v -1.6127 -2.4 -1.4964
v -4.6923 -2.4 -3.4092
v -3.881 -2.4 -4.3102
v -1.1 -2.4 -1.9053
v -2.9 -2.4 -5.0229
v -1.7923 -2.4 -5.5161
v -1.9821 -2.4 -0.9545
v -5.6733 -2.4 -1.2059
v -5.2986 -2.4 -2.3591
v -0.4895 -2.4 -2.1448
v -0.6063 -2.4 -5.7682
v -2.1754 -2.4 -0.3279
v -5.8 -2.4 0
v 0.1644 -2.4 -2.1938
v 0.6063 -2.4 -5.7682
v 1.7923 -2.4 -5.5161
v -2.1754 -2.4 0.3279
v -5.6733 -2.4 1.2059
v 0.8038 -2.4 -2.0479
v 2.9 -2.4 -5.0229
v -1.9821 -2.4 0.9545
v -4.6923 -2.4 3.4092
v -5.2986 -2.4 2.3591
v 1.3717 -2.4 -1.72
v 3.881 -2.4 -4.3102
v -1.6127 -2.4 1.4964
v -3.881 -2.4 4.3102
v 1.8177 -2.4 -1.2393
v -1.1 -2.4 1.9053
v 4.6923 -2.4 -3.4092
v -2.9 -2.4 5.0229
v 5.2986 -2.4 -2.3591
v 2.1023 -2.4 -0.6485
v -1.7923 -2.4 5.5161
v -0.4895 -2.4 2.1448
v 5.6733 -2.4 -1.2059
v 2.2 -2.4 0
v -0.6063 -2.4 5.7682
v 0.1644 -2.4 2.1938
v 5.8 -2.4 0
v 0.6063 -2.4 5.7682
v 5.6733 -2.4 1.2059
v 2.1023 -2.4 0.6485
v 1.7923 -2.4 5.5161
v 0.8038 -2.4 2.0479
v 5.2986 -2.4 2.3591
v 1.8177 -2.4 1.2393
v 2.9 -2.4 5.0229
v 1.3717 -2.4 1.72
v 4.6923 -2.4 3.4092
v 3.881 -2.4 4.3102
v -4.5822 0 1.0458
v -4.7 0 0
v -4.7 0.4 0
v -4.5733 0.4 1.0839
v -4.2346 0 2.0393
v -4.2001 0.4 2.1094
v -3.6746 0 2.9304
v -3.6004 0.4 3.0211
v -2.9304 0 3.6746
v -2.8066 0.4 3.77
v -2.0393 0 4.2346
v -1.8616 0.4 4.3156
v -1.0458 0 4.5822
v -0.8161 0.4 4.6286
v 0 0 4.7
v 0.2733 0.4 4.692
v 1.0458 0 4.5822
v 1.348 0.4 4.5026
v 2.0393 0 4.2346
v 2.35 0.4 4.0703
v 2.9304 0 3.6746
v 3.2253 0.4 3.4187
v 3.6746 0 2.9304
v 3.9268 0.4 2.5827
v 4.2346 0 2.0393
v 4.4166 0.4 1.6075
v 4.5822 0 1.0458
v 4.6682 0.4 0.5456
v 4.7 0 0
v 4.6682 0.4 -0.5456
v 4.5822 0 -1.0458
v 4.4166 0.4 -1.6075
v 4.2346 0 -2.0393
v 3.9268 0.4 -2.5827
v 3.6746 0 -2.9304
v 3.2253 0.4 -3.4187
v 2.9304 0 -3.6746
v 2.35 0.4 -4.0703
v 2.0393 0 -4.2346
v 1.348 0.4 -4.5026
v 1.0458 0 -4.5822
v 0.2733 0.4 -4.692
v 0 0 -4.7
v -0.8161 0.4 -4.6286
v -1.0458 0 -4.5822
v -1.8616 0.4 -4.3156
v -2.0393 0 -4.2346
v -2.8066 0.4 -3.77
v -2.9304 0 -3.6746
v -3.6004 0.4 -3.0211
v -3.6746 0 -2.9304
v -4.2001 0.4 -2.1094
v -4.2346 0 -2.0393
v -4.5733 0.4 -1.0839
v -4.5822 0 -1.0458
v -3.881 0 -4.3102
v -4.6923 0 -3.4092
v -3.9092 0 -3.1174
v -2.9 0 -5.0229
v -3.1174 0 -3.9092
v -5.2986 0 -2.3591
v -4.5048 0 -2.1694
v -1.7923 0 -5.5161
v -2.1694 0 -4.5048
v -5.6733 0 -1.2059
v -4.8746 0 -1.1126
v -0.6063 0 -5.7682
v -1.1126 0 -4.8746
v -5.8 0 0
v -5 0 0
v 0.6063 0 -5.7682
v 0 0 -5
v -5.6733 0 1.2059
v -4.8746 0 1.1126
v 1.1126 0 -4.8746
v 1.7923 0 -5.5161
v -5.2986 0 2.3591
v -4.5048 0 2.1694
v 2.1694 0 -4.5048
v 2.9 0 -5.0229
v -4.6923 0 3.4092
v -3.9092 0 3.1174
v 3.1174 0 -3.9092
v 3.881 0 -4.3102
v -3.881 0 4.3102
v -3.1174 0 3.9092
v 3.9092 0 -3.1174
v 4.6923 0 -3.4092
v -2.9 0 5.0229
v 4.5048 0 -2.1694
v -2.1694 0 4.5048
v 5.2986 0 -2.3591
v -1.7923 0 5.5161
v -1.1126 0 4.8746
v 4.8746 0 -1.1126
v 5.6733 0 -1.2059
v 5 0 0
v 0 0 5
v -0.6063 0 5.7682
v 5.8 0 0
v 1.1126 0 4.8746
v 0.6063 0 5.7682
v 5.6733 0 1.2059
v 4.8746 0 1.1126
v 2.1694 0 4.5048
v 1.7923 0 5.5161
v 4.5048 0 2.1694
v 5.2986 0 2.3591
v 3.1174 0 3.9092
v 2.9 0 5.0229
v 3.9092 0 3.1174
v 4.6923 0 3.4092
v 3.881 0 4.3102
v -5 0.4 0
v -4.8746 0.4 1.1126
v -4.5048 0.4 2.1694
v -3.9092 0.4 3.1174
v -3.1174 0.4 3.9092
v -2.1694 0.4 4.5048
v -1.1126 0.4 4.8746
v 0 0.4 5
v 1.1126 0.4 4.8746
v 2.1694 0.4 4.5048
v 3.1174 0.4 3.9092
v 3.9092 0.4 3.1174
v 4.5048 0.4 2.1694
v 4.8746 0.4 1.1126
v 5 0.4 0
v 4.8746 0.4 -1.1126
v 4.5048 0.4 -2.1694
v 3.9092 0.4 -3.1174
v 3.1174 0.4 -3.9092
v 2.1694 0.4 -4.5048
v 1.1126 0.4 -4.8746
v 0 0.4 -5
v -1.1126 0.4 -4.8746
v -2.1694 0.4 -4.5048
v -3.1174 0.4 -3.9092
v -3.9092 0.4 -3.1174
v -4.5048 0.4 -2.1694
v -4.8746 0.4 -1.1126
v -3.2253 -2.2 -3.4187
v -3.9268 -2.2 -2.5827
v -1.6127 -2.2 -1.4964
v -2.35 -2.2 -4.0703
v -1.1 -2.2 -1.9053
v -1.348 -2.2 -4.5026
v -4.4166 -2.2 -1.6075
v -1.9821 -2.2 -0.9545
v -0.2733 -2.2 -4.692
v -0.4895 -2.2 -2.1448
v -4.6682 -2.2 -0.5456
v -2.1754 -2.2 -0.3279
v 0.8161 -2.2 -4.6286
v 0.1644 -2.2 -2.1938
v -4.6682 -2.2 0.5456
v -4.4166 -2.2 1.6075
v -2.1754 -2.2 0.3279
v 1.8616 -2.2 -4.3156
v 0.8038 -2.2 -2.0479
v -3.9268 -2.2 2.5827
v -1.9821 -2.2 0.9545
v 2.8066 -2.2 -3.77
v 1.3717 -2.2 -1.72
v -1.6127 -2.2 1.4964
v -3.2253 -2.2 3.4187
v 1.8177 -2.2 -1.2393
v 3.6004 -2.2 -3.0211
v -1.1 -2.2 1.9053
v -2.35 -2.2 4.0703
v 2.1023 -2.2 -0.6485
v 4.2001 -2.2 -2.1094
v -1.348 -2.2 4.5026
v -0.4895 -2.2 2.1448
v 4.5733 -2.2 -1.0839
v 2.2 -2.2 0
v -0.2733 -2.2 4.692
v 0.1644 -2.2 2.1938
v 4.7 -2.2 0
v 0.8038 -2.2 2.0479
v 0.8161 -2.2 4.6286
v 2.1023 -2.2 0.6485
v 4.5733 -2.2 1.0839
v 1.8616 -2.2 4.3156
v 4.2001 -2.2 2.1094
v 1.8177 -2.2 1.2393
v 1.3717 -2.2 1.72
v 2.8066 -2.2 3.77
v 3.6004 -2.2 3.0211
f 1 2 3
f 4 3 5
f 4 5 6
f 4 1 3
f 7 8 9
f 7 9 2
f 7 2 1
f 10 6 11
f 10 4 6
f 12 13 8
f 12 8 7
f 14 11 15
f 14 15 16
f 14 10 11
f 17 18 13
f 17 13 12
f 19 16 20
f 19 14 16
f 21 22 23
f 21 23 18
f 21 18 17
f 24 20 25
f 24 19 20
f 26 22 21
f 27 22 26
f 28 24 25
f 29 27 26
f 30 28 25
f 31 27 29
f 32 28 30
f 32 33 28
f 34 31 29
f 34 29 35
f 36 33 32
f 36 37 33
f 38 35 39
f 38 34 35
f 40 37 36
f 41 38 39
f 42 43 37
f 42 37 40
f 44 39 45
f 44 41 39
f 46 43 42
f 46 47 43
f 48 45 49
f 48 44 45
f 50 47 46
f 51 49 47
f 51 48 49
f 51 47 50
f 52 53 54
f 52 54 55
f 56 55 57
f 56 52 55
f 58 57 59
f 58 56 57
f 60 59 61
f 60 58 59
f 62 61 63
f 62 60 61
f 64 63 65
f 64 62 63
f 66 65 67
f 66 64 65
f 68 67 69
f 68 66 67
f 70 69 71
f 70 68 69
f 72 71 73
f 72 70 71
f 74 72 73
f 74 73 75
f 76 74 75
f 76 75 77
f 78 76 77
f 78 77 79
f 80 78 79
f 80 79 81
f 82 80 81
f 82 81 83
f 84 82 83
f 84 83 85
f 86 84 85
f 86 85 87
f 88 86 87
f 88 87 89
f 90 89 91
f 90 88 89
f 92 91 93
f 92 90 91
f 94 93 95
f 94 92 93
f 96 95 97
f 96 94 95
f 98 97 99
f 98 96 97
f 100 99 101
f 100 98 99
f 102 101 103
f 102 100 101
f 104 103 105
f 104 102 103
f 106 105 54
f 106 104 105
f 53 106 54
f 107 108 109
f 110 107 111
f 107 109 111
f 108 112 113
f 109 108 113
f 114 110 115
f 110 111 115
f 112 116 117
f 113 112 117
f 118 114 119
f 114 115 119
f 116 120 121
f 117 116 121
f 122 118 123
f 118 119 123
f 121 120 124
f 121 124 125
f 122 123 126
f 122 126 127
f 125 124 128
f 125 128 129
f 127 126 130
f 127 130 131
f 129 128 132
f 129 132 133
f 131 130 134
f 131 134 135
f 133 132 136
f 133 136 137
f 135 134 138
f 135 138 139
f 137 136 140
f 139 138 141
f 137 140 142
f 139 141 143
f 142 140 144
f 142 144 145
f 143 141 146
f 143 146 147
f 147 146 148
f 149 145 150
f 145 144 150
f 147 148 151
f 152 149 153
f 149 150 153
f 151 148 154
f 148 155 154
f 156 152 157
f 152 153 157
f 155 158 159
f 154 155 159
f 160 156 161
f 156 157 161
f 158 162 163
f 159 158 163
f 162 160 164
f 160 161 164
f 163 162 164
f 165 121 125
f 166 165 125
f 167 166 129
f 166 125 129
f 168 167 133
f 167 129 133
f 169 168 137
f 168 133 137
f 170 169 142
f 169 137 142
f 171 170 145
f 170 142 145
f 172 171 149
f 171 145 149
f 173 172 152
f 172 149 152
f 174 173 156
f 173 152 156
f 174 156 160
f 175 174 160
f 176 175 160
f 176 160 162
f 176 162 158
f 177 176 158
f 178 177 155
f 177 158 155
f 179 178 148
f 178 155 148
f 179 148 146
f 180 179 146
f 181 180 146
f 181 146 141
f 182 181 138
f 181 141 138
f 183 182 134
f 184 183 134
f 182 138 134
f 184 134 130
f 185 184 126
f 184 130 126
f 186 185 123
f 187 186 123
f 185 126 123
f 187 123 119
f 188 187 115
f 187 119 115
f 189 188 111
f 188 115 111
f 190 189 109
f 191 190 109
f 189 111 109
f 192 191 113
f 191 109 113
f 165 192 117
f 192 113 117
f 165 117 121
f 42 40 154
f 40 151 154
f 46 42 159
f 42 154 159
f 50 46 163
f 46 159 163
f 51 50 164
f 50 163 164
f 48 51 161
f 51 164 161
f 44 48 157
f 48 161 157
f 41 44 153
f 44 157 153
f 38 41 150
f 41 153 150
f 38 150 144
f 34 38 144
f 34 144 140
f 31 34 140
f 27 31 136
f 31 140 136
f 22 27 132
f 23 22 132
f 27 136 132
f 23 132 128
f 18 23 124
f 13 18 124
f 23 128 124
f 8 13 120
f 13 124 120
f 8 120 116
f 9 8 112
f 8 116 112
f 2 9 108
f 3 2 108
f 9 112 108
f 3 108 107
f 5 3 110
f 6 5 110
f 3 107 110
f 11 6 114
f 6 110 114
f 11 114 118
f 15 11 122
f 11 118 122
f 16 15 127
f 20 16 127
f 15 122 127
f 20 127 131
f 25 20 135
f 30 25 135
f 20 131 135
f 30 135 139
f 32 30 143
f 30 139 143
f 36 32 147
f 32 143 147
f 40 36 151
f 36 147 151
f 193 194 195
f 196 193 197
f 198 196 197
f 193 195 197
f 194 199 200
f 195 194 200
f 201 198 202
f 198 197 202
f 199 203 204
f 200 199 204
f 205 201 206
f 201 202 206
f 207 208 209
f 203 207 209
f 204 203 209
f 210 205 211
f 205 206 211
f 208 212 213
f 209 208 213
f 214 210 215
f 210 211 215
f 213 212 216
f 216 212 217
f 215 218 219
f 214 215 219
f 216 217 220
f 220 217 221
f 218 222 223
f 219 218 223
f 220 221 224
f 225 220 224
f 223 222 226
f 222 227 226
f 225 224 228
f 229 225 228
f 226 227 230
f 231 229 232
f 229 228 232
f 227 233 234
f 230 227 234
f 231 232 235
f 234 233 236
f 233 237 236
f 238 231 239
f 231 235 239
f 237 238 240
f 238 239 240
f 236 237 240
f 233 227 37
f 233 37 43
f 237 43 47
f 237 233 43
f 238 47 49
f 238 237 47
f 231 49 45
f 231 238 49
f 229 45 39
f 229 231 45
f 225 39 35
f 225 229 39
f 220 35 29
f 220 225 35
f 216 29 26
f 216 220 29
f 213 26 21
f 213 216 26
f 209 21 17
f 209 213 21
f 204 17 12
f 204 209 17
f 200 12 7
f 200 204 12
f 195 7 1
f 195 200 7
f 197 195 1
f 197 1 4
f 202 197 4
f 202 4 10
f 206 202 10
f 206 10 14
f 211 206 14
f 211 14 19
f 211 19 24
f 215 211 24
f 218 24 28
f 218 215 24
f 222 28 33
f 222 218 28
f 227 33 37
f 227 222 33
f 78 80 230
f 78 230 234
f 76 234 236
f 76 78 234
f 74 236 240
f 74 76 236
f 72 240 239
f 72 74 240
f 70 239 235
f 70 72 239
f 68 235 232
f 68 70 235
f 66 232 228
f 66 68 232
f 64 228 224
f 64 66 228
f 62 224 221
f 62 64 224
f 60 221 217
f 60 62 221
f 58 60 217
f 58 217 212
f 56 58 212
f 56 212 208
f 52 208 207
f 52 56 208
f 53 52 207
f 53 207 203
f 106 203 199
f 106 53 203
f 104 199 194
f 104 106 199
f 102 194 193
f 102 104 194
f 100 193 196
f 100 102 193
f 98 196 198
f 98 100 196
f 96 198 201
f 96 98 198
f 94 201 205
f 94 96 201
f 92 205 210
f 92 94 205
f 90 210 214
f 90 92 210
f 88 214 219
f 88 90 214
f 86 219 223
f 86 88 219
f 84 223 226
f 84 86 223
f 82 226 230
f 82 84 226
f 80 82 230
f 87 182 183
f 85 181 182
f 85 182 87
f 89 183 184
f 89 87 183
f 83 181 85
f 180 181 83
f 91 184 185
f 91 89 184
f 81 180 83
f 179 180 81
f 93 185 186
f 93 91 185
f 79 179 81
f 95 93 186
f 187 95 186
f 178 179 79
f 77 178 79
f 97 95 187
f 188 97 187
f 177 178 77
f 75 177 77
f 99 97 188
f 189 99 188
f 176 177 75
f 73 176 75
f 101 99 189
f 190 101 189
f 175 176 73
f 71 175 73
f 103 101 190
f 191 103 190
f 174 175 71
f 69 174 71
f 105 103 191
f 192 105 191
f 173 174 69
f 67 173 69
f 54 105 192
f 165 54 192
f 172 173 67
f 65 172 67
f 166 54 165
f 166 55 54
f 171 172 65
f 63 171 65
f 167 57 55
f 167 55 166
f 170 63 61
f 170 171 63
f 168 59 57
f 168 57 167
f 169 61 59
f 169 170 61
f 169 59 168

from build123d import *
from build123d import SkipClean  # not in build123d's __all__

# Parameters (mm, degrees)
F0_R     = 5.8
F1_DEPTH = 1.8
F2_R     = 5.8
F2_R_2   = 4.7
F3_DEPTH = 0.4
F4_R     = 4.7
F5_DEPTH = 1.8
F6_R     = 5.8
F6_R_2   = 4.7
F6_R_3   = 2.2
F7_DEPTH = 0.2
F8_R     = 5
F8_R_2   = 4.7
F9_DEPTH = 0.4


# Not quite as in the source:
# - a feature names something its author has since deleted; it is built from what else it names


with BuildPart() as f1:
    # F0 (on Front) → F1 (new body)
    with BuildSketch(Plane.XZ):
        Circle(F0_R)
    extrude(amount=F1_DEPTH)

    # F2 (on face) → F3 (join)
    with BuildSketch(Plane.XZ.offset(1.8)):
        Circle(F2_R)
        Circle(F2_R_2, mode=Mode.SUBTRACT)
    extrude(amount=F3_DEPTH)

    # F4 (on face) → F5 (cut)
    with BuildSketch(Plane.XZ.offset(1.8)):
        Circle(F4_R)
    extrude(amount=-F5_DEPTH, mode=Mode.SUBTRACT)

    # F6 (on face) → F7 (join)
    with BuildSketch(Plane.XZ.offset(2.2)):
        Circle(F6_R)
        Circle(F6_R_2, mode=Mode.SUBTRACT)
        Circle(F6_R_2)
        Circle(F6_R_3, mode=Mode.SUBTRACT)
    extrude(amount=F7_DEPTH)

    # F8 (on face) → F9 (join)
    with BuildSketch(Plane(origin=(0, 0, 0), x_dir=(-1, 0, 0), z_dir=(0, 1, 0))):
        Circle(F8_R)
        Circle(F8_R_2, mode=Mode.SUBTRACT)
    with SkipClean():  # cleaning this boolean's faces spoils the solid; the shape is the same uncleaned
        extrude(amount=F9_DEPTH)


solid = f1.part
